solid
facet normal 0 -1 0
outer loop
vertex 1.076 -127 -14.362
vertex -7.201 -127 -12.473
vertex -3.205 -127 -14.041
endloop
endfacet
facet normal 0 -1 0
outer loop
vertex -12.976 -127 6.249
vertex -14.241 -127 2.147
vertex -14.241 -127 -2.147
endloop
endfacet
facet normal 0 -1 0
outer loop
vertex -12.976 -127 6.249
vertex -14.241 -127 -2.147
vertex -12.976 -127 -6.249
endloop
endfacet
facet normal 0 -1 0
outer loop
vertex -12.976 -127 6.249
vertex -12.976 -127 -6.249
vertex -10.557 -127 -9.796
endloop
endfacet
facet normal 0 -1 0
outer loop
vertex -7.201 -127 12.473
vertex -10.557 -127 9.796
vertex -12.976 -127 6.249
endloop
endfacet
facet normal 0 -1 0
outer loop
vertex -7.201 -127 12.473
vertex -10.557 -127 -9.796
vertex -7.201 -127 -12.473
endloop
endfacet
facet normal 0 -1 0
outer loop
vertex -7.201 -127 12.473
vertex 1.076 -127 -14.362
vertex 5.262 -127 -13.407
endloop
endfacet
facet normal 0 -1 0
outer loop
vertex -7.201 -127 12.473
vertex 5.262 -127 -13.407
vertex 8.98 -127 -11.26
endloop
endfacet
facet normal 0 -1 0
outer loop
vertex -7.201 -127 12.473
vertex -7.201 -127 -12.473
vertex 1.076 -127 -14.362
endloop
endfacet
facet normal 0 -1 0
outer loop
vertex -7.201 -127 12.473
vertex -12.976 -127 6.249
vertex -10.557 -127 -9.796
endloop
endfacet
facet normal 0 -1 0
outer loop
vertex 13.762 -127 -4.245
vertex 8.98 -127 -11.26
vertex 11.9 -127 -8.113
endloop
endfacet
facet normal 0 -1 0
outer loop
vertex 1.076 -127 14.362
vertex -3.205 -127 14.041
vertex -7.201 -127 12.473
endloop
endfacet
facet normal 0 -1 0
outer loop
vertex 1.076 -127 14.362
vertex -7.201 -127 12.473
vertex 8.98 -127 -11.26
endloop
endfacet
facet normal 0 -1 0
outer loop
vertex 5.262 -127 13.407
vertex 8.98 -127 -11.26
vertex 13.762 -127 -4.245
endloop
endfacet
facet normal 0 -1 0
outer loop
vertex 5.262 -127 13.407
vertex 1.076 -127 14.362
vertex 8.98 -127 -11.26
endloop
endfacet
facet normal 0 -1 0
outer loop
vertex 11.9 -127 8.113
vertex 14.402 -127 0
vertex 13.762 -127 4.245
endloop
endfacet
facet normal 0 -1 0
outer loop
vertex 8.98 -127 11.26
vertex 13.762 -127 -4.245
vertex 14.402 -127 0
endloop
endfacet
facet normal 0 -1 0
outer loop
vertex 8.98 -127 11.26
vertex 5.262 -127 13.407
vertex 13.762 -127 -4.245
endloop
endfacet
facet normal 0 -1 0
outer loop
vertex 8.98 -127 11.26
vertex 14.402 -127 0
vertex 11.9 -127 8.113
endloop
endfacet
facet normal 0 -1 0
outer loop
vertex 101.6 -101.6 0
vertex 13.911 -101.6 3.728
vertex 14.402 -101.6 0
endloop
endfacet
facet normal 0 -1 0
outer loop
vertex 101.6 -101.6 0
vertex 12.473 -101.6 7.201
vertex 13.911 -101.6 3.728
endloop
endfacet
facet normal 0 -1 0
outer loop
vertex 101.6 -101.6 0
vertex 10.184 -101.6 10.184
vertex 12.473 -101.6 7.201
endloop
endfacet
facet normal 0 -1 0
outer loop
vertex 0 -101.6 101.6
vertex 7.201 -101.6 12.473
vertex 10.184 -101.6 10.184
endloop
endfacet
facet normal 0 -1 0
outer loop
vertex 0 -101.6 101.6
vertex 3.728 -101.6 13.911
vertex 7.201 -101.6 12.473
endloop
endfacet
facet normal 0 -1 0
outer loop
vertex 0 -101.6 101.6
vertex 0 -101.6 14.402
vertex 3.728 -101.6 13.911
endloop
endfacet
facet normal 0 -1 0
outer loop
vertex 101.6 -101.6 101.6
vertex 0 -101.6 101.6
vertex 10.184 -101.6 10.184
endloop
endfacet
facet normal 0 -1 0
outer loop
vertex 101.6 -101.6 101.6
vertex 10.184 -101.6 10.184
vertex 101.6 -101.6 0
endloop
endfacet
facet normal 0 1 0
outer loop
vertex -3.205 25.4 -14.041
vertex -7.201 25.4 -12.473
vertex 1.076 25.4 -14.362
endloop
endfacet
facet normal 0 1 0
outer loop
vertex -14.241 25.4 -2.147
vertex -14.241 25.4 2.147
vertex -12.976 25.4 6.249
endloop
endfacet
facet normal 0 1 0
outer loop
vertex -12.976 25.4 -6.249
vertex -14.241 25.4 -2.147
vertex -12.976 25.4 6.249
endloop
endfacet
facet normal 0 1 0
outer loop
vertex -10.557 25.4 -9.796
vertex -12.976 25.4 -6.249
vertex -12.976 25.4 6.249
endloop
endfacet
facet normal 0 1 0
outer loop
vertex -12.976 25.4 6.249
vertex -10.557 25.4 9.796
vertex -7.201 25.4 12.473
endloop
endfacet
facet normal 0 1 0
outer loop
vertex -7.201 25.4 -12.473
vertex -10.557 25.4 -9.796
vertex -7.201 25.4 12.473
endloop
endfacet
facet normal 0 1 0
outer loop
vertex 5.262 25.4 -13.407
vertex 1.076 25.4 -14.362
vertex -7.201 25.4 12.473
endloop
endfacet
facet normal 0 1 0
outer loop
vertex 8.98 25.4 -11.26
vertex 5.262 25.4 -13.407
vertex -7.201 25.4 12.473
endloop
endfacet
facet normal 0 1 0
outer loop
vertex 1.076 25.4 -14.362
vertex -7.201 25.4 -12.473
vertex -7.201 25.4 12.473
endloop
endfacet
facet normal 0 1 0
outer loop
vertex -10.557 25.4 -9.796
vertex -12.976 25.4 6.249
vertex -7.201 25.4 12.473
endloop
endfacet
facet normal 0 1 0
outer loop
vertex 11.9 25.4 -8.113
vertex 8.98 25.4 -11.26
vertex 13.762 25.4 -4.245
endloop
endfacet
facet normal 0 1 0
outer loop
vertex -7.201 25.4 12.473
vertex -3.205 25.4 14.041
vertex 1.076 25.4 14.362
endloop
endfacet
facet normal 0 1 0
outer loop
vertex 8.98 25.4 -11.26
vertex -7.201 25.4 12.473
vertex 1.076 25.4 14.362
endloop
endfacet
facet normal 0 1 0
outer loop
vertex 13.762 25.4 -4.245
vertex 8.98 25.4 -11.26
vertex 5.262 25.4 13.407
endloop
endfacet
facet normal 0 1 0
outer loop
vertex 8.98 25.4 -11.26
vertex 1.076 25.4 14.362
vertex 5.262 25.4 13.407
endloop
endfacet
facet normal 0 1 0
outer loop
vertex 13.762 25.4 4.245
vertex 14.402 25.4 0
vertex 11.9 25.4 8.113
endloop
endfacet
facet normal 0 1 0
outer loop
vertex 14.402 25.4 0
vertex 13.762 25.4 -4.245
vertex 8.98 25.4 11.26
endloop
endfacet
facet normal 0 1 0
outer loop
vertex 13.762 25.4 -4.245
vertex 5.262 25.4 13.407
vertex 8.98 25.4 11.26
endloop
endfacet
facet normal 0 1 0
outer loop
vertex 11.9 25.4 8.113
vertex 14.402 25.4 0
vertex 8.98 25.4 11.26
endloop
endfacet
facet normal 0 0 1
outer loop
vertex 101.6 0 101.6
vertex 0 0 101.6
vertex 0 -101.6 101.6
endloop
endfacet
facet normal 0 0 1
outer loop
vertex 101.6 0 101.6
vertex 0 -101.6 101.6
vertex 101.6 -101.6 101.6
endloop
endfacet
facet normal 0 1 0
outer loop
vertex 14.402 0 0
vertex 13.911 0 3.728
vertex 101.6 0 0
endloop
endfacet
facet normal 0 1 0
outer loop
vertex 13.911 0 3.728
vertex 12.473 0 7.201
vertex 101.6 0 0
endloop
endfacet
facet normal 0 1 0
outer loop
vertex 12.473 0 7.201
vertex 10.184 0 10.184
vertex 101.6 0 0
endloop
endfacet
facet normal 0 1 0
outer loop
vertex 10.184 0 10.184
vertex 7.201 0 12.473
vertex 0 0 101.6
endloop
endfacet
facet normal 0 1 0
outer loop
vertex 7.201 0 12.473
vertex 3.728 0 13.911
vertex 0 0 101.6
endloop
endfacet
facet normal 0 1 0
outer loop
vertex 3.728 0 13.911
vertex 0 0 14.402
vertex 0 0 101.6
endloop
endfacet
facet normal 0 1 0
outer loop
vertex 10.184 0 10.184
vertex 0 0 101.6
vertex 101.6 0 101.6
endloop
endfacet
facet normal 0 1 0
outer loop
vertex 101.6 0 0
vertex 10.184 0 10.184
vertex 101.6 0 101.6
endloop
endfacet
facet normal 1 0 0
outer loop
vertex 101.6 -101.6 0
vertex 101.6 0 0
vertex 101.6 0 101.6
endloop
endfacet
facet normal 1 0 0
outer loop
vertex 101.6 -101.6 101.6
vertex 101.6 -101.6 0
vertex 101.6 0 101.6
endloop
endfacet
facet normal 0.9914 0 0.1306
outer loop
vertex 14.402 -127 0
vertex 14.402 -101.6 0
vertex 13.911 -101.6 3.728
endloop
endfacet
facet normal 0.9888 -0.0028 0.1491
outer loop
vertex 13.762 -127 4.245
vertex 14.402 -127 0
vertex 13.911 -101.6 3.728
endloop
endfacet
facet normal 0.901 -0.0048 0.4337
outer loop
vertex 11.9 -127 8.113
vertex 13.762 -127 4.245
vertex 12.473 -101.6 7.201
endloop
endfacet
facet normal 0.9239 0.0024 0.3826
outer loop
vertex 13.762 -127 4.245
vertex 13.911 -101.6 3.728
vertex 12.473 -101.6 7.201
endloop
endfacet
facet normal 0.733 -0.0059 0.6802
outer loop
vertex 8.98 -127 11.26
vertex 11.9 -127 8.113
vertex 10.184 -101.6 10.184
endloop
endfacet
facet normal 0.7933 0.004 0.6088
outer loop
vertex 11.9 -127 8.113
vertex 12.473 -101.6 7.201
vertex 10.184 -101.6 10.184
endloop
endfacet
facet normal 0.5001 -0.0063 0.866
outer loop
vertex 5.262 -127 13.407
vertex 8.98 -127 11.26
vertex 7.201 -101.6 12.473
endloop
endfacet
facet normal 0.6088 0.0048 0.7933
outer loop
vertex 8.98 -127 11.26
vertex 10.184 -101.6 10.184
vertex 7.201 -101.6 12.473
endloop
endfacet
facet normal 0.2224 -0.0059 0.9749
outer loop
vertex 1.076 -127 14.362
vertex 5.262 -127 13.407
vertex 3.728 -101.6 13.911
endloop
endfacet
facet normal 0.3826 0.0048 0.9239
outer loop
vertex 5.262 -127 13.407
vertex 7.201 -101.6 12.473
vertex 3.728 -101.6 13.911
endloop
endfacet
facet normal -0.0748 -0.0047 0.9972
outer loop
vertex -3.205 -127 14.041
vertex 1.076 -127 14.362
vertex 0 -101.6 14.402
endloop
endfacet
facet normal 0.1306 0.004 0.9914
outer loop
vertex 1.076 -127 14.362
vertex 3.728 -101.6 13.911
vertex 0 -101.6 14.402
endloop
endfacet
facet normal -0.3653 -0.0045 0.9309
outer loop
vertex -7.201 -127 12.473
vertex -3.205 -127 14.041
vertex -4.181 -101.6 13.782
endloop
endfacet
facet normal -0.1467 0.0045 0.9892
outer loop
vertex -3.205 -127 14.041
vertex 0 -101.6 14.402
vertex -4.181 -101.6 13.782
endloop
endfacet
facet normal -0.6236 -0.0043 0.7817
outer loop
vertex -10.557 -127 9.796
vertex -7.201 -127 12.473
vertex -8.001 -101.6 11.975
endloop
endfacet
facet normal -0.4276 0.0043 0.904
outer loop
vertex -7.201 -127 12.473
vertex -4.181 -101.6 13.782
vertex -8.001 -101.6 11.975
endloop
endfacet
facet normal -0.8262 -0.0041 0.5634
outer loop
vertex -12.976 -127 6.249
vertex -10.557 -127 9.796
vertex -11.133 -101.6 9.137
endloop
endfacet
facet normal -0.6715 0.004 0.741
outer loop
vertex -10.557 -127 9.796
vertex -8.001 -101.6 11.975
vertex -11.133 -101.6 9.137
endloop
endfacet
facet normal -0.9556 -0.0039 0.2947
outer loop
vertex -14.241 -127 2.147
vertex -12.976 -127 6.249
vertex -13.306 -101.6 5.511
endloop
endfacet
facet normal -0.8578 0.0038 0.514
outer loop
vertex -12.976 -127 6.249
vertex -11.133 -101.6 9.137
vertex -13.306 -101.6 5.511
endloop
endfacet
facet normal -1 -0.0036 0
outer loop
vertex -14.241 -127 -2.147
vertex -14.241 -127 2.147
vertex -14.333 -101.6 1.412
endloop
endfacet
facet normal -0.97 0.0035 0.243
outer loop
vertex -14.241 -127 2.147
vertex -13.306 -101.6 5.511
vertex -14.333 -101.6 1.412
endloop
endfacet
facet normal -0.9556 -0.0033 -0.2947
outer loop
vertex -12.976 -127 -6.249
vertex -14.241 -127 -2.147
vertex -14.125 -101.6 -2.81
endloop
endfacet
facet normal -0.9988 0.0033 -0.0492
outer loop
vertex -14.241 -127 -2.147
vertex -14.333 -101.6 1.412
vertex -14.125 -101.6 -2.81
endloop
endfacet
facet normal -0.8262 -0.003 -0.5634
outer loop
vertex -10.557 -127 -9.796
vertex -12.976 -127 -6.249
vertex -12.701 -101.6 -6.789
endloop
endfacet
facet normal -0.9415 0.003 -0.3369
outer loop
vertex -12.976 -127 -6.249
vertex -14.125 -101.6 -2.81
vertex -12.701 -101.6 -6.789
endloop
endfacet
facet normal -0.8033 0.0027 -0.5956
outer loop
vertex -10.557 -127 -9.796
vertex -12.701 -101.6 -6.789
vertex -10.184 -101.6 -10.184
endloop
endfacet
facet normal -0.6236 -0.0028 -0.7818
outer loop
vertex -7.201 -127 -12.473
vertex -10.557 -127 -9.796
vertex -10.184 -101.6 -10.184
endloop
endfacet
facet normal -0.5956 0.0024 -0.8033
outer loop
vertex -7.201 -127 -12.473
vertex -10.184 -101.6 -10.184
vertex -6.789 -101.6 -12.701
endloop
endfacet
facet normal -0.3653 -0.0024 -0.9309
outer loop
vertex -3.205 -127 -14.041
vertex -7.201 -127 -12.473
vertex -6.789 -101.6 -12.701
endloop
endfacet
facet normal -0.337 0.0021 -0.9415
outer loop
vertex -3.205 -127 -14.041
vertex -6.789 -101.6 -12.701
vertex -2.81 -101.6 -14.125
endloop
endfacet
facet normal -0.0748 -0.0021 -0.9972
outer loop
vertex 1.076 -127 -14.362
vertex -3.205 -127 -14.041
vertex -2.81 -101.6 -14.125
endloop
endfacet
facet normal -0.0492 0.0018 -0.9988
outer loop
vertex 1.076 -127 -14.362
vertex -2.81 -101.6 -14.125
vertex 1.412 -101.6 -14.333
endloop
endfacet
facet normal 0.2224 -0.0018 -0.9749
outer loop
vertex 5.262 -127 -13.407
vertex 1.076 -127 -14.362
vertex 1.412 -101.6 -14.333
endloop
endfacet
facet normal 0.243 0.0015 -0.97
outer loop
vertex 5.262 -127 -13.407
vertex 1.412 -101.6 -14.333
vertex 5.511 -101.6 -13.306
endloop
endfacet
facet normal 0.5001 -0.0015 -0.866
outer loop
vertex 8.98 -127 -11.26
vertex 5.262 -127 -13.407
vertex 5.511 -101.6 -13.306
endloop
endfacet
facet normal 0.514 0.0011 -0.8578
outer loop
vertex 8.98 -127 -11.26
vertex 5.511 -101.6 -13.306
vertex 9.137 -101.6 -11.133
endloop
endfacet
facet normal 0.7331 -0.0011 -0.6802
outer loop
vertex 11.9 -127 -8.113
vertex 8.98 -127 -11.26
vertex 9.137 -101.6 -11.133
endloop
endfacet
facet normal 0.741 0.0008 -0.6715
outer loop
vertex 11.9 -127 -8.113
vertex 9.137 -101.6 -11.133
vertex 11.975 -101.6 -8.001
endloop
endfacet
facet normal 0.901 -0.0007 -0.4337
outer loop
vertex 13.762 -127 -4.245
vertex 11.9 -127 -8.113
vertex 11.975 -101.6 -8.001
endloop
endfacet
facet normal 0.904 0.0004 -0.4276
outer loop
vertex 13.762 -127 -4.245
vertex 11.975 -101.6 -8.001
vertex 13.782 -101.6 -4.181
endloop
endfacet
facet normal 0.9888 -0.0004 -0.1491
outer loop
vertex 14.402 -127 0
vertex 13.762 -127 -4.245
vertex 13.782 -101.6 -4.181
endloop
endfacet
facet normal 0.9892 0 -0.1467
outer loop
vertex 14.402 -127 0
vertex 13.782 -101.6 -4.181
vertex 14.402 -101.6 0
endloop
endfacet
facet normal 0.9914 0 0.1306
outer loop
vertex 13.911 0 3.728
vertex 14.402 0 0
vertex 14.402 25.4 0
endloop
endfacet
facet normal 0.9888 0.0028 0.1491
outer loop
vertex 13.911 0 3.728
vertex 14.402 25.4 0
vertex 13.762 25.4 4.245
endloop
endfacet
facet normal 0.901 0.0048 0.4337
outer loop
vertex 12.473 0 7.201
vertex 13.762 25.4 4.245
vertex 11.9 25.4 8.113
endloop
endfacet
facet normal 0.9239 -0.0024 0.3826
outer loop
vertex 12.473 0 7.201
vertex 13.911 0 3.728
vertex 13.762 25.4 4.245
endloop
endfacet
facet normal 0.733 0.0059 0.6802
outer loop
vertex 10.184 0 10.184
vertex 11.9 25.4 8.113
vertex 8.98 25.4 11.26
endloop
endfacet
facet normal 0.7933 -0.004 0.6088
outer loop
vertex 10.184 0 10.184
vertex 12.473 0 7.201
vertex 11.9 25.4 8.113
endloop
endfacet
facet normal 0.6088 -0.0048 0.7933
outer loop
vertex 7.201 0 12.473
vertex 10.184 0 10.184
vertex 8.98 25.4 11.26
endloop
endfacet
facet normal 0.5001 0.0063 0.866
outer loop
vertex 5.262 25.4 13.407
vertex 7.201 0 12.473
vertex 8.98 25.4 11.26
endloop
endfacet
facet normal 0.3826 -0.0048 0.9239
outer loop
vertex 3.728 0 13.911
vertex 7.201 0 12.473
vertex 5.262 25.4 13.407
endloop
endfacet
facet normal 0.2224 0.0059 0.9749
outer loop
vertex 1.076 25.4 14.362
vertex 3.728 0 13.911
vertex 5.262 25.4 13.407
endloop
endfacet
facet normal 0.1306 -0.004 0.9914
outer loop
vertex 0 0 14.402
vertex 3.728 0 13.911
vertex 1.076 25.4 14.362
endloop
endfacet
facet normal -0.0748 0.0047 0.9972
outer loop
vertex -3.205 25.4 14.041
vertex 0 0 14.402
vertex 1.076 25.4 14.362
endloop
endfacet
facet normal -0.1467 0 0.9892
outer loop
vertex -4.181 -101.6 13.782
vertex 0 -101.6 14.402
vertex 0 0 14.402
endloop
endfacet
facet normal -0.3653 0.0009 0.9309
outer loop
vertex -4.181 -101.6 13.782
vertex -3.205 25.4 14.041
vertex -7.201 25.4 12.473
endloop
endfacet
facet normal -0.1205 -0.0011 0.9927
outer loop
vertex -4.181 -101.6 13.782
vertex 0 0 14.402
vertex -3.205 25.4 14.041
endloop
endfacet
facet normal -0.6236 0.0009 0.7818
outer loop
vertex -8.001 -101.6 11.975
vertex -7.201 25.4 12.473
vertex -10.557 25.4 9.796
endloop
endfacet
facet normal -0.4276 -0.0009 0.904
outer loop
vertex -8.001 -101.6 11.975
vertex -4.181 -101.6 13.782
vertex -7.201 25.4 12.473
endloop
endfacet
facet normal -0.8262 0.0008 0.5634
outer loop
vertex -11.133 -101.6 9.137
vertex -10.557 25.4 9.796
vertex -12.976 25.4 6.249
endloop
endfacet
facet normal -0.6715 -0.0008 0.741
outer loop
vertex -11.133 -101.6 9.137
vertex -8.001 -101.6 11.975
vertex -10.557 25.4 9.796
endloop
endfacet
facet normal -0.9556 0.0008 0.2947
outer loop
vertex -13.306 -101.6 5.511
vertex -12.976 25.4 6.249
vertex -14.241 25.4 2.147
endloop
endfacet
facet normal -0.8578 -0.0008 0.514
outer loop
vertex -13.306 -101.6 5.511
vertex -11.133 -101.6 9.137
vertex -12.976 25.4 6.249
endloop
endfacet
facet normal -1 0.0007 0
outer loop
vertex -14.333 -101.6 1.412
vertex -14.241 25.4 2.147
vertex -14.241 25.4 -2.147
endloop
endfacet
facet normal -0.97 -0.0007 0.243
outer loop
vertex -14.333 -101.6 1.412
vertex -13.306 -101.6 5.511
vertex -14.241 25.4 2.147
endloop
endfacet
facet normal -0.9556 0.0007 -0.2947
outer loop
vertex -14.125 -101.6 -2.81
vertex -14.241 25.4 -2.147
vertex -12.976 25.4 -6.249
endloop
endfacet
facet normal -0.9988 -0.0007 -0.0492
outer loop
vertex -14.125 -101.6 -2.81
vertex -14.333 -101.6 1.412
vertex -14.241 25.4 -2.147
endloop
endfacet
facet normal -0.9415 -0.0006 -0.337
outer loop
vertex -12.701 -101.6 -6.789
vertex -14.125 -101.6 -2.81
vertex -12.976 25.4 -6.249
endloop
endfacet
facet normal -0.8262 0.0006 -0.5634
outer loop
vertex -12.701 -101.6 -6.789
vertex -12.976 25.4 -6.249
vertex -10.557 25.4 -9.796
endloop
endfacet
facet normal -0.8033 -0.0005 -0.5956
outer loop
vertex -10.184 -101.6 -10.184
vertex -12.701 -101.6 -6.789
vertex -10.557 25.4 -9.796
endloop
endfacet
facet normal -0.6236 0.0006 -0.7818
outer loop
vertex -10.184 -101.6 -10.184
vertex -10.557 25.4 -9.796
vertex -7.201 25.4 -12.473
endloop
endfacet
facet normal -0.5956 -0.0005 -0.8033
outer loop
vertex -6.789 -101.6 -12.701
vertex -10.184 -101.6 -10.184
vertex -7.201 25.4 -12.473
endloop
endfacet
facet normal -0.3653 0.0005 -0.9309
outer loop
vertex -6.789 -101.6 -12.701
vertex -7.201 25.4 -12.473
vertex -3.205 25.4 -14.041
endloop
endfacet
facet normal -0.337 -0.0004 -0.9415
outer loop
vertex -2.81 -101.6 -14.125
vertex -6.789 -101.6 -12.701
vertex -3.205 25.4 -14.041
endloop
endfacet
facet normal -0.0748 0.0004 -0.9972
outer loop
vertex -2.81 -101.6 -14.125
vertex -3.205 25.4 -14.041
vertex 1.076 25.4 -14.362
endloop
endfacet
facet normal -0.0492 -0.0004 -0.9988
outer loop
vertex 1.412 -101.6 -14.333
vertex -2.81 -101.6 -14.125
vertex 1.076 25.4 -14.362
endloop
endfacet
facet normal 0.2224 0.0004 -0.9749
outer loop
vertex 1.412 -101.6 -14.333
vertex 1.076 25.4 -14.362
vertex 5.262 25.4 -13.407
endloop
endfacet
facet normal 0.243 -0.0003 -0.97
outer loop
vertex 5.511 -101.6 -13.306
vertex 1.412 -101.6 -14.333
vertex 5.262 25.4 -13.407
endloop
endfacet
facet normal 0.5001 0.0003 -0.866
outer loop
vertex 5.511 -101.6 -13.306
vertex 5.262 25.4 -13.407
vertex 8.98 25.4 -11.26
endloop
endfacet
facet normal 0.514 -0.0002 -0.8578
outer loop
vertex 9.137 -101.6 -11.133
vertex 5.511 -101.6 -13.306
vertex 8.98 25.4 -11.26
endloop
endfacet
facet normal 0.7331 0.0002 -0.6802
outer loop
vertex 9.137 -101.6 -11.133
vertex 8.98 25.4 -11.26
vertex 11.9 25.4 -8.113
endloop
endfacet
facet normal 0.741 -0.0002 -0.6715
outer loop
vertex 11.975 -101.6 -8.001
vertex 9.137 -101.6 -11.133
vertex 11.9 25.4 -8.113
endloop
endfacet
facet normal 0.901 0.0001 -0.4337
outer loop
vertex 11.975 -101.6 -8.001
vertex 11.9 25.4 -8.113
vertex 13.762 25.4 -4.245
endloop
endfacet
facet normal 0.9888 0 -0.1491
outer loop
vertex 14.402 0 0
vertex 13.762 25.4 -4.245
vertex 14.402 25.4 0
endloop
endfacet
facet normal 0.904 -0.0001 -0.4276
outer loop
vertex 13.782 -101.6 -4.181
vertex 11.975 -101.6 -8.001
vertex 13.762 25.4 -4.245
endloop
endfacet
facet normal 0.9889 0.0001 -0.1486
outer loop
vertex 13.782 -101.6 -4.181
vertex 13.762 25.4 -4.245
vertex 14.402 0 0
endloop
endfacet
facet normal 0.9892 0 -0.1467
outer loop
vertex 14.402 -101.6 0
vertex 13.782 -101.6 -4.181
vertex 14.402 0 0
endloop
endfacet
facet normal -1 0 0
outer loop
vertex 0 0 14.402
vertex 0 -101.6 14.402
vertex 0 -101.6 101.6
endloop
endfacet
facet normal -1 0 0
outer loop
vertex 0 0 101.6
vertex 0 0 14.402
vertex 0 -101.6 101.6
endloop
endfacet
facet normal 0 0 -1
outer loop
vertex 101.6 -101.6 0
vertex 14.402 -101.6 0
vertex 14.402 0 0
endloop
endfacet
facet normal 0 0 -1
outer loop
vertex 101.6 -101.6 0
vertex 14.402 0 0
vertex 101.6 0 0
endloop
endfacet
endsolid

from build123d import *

# Parameters (mm, degrees)
F0_W          = 101.6
F0_H          = 101.6
F1_DEPTH      = 101.6
F3_R          = 14.402071
F4_DEPTH      = 25.4
F4_DEPTH_BACK = 127


with BuildPart() as f1:
    # F0 (on Front) → F1 (new body)
    with BuildSketch(Plane.XZ):
        with Locations((50.8, 50.8)):
            Rectangle(F0_W, F0_H)
    extrude(amount=F1_DEPTH)

    # F3 (on offset) → F4 (join, two sides)
    with BuildSketch(Plane.XZ.offset(101.6)) as f4_sk:
        Circle(F3_R)
    extrude(amount=F4_DEPTH)
    extrude(f4_sk.sketch, amount=-F4_DEPTH_BACK)


solid = f1.part
